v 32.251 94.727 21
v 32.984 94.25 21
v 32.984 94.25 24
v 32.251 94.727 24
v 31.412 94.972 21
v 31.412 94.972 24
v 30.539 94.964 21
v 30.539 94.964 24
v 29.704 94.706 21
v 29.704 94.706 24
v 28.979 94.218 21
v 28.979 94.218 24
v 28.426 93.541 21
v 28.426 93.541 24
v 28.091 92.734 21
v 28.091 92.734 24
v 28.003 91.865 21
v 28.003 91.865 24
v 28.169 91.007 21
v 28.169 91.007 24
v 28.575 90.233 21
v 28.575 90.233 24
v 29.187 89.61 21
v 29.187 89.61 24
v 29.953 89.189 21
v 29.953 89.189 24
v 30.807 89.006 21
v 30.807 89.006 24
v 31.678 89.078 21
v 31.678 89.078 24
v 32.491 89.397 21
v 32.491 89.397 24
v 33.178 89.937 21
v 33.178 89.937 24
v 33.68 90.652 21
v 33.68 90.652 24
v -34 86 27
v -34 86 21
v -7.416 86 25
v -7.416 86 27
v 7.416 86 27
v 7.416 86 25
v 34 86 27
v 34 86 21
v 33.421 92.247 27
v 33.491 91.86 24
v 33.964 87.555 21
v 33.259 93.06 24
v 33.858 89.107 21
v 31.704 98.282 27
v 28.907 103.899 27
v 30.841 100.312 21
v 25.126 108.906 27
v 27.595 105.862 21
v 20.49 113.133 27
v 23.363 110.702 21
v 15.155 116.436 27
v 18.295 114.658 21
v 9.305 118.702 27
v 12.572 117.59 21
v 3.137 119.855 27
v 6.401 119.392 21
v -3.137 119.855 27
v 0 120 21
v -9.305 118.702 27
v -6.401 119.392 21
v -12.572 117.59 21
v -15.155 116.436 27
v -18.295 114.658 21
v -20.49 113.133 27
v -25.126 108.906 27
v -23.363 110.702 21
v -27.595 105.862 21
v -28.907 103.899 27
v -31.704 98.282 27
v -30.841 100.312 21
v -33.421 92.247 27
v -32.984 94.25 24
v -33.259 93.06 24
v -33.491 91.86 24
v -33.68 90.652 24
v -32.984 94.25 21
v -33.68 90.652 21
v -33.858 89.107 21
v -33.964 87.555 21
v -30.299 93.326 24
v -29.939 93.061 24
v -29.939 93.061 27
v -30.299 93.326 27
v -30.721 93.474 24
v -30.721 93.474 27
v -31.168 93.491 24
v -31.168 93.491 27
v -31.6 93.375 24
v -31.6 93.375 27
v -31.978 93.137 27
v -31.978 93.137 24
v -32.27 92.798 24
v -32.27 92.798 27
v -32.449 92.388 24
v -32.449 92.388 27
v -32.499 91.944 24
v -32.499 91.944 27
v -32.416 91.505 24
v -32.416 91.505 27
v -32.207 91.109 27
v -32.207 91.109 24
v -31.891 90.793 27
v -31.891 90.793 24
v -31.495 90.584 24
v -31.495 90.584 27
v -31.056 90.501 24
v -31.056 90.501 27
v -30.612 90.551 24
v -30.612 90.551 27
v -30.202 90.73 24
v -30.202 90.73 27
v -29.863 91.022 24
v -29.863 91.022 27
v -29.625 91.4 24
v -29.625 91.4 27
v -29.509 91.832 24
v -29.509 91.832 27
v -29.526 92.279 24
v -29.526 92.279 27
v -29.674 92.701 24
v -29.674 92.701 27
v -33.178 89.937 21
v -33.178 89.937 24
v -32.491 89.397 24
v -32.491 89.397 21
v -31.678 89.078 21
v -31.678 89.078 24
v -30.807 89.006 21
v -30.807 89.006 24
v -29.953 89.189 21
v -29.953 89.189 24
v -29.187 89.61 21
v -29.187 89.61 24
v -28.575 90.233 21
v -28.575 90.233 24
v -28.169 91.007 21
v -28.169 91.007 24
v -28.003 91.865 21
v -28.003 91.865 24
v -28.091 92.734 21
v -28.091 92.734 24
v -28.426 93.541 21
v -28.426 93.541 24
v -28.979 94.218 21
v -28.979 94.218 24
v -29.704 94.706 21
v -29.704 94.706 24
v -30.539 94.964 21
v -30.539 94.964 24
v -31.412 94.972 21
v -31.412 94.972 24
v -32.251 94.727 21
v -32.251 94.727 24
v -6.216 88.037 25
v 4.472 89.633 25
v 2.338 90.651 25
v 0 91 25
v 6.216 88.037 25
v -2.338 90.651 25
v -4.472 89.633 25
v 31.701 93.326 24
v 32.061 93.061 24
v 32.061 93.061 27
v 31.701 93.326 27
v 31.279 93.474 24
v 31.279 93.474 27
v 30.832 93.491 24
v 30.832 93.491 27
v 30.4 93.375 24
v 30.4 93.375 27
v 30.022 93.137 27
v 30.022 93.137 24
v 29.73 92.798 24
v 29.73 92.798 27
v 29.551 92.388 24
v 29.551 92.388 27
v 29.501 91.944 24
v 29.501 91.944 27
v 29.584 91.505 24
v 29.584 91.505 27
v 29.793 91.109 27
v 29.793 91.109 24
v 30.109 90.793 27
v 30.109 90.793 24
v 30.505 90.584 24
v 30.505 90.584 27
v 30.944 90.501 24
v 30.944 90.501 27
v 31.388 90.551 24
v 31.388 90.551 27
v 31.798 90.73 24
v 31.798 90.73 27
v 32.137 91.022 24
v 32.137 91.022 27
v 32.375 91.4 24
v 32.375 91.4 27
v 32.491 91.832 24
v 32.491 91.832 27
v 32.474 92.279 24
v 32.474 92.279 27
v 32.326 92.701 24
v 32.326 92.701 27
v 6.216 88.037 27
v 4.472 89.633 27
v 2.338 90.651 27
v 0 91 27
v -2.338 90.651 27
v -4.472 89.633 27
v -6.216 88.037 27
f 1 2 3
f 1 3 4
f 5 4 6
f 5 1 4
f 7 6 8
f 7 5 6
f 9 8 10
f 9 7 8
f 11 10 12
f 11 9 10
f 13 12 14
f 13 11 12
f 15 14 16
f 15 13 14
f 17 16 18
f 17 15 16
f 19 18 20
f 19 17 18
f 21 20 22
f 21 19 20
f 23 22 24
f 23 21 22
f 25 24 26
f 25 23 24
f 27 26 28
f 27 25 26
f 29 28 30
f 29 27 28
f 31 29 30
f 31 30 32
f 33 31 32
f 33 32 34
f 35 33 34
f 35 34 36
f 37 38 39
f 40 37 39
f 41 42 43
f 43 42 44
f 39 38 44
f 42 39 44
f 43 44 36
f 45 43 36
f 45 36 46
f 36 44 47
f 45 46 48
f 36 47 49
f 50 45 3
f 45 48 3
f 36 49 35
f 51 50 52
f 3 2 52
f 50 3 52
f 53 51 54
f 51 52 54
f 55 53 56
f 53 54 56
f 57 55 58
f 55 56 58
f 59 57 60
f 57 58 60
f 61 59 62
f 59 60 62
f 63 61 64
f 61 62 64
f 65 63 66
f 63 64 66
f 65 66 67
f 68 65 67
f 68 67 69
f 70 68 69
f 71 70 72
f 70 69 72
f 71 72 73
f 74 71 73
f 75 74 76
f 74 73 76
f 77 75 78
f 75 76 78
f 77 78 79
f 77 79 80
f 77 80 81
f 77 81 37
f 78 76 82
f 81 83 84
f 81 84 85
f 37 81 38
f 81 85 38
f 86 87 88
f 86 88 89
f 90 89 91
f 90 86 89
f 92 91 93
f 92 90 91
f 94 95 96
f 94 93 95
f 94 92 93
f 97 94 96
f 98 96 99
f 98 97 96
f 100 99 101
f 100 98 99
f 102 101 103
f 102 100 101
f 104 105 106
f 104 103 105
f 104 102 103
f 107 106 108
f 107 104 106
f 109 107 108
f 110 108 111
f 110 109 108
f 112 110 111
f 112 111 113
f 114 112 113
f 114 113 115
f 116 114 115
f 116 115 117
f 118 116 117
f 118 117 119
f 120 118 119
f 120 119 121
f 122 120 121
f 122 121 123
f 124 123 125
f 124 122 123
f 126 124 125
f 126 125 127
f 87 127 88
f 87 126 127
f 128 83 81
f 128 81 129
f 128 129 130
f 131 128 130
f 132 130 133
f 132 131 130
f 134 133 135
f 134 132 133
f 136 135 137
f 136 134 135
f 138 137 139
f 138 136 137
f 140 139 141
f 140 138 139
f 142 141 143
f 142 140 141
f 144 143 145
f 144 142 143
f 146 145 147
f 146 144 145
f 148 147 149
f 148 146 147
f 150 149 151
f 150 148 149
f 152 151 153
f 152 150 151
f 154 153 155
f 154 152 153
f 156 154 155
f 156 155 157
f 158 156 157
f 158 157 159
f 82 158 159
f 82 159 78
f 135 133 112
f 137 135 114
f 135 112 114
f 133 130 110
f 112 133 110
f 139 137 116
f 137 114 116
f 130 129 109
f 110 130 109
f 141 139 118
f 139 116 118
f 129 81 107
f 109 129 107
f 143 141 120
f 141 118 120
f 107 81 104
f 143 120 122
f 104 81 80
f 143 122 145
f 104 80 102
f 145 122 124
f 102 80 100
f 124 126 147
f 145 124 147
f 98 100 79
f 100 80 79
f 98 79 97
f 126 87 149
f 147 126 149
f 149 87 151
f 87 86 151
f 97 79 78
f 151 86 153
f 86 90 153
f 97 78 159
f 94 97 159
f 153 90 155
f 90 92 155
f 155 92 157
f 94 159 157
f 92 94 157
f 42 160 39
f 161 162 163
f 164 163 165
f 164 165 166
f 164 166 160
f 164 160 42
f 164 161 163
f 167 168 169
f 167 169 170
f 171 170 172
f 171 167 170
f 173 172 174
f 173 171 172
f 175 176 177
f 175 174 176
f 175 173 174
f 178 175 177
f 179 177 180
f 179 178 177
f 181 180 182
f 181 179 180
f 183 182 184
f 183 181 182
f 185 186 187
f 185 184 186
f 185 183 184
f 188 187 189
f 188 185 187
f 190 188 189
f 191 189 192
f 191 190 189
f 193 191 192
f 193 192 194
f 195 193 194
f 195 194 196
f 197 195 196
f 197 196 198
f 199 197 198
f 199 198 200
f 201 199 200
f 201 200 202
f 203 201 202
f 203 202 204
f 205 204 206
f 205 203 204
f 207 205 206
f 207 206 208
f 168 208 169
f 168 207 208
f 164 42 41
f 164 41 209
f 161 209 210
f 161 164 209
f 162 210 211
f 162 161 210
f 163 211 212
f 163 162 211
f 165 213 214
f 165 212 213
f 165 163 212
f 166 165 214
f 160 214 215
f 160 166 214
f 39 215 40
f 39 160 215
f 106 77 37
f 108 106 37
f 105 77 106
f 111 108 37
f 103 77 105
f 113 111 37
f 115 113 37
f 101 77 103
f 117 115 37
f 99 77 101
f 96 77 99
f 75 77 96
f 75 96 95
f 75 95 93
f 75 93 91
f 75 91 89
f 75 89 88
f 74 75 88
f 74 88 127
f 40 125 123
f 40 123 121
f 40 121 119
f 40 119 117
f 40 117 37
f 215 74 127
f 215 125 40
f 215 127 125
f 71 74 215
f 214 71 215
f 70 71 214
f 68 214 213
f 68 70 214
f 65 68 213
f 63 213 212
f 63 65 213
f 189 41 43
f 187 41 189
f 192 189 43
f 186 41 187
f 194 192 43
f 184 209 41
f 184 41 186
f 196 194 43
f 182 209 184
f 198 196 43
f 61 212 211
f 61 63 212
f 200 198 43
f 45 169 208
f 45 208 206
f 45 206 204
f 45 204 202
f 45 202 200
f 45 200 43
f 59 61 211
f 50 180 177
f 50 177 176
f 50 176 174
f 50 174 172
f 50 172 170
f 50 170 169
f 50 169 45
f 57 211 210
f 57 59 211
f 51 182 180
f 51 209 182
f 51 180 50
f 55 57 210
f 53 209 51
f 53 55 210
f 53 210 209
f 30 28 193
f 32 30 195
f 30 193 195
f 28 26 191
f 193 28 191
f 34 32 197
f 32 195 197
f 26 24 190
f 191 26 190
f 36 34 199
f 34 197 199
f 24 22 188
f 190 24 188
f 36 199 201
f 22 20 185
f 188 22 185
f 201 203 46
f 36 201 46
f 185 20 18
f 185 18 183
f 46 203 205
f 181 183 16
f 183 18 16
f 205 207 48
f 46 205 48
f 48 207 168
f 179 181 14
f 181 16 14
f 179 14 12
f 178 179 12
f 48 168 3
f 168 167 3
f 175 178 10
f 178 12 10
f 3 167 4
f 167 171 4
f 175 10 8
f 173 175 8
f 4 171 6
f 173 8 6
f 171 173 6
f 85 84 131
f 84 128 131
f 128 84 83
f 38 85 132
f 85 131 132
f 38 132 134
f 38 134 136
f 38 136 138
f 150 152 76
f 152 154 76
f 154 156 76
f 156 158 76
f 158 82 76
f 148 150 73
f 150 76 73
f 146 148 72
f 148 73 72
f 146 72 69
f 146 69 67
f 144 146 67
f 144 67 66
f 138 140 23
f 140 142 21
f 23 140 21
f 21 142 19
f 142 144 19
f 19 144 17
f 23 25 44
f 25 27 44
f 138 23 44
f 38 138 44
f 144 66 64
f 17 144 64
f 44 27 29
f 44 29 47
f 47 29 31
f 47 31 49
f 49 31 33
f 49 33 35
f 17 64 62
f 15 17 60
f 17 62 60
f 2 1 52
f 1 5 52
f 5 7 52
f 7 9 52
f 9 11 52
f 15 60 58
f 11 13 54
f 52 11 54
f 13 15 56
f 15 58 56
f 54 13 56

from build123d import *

# Parameters (mm, degrees)
CYLINDER687_R               = 8
CYLINDER687_DEPTH           = 6
CYLINDER688_R               = 3
CYLINDER688_DEPTH           = 3
CYLINDER688_PLACEMENT_ANGLE = 45
CYLINDER668_R               = 3
CYLINDER668_DEPTH           = 3
CYLINDER668_PLACEMENT_ANGLE = 45
CYLINDER676_R               = 3
CYLINDER676_DEPTH           = 3
CYLINDER676_PLACEMENT_ANGLE = 45
CYLINDER683_R               = 3
CYLINDER683_DEPTH           = 3
CYLINDER683_PLACEMENT_ANGLE = 45
CYLINDER681_R               = 1.5
CYLINDER681_DEPTH           = 50
CYLINDER681_PLACEMENT_ANGLE = 45
CYLINDER686_R               = 1.5
CYLINDER686_DEPTH           = 50
CYLINDER686_PLACEMENT_ANGLE = 45
CYLINDER685_R               = 1.5
CYLINDER685_DEPTH           = 50
CYLINDER685_PLACEMENT_ANGLE = 45
CYLINDER675_R               = 1.5
CYLINDER675_DEPTH           = 50
CYLINDER675_PLACEMENT_ANGLE = 45
BOX250_W                    = 148
BOX250_H                    = 40
BOX250_DEPTH                = 40
CYLINDER671_R               = 34
CYLINDER671_DEPTH           = 6


with BuildPart() as v_lec687:
    # Cylinder687 → Cylinder687 (new body)
    with BuildSketch(Plane(origin=(0, 83, 25), x_dir=(1, 0, 0), z_dir=(0, 0, 1))):
        Circle(CYLINDER687_R)
    extrude(amount=CYLINDER687_DEPTH)


with BuildPart() as v_lec688:
    # Cylinder688 → Cylinder688 (new body)
    with BuildSketch(Plane.XY):
        Circle(CYLINDER688_R)
    extrude(amount=CYLINDER688_DEPTH)


with BuildPart() as v_lec688_1:
    # Cylinder688 placement: moved
    add(v_lec688.part.moved(Location((-31, 92, 21))).rotate(Axis((-31, 92, 21), (0, 0, 1)), CYLINDER688_PLACEMENT_ANGLE))


with BuildPart() as v_lec668:
    # Cylinder668 → Cylinder668 (new body)
    with BuildSketch(Plane.XY):
        Circle(CYLINDER668_R)
    extrude(amount=CYLINDER668_DEPTH)


with BuildPart() as v_lec668_1:
    # Cylinder668 placement: moved
    add(v_lec668.part.moved(Location((31, 110, 0))).rotate(Axis((31, 110, 0), (0, 0, 1)), CYLINDER668_PLACEMENT_ANGLE))


with BuildPart() as v_lec676:
    # Cylinder676 → Cylinder676 (new body)
    with BuildSketch(Plane.XY):
        Circle(CYLINDER676_R)
    extrude(amount=CYLINDER676_DEPTH)


with BuildPart() as v_lec676_1:
    # Cylinder676 placement: moved
    add(v_lec676.part.moved(Location((31, 92, 21))).rotate(Axis((31, 92, 21), (0, 0, 1)), CYLINDER676_PLACEMENT_ANGLE))


with BuildPart() as compound400:
    # Cylinder683 → Cylinder683 (new body)
    with BuildSketch(Plane.XY):
        Circle(CYLINDER683_R)
    extrude(amount=CYLINDER683_DEPTH)


with BuildPart() as compound400_1:
    # Cylinder683 placement: moved
    add(compound400.part.moved(Location((-31, 110, 0))).rotate(Axis((-31, 110, 0), (0, 0, 1)), CYLINDER683_PLACEMENT_ANGLE))

    # Compound400: union Válec688, Válec668, Válec676
    add(v_lec688_1.part)
    add(v_lec668_1.part)
    add(v_lec676_1.part)


with BuildPart() as v_lec681:
    # Cylinder681 → Cylinder681 (new body)
    with BuildSketch(Plane.XY):
        Circle(CYLINDER681_R)
    extrude(amount=CYLINDER681_DEPTH)


with BuildPart() as v_lec681_1:
    # Cylinder681 placement: moved
    add(v_lec681.part.moved(Location((-31, 92, 0))).rotate(Axis((-31, 92, 0), (0, 0, 1)), CYLINDER681_PLACEMENT_ANGLE))


with BuildPart() as v_lec686:
    # Cylinder686 → Cylinder686 (new body)
    with BuildSketch(Plane.XY):
        Circle(CYLINDER686_R)
    extrude(amount=CYLINDER686_DEPTH)


with BuildPart() as v_lec686_1:
    # Cylinder686 placement: moved
    add(v_lec686.part.moved(Location((31, 110, 0))).rotate(Axis((31, 110, 0), (0, 0, 1)), CYLINDER686_PLACEMENT_ANGLE))


with BuildPart() as v_lec685:
    # Cylinder685 → Cylinder685 (new body)
    with BuildSketch(Plane.XY):
        Circle(CYLINDER685_R)
    extrude(amount=CYLINDER685_DEPTH)


with BuildPart() as v_lec685_1:
    # Cylinder685 placement: moved
    add(v_lec685.part.moved(Location((31, 92, 0))).rotate(Axis((31, 92, 0), (0, 0, 1)), CYLINDER685_PLACEMENT_ANGLE))


with BuildPart() as compound396:
    # Cylinder675 → Cylinder675 (new body)
    with BuildSketch(Plane.XY):
        Circle(CYLINDER675_R)
    extrude(amount=CYLINDER675_DEPTH)


with BuildPart() as compound396_1:
    # Cylinder675 placement: moved
    add(compound396.part.moved(Location((-31, 110, 0))).rotate(Axis((-31, 110, 0), (0, 0, 1)), CYLINDER675_PLACEMENT_ANGLE))

    # Compound396: union Válec681, Válec686, Válec685
    add(v_lec681_1.part)
    add(v_lec686_1.part)
    add(v_lec685_1.part)


with BuildPart() as krychle250:
    # Box250 → Box250 (new body)
    with BuildSketch(Plane(origin=(-74, 46, 16), x_dir=(1, 0, 0), z_dir=(0, 0, 1))):
        with Locations((74, 20)):
            Rectangle(BOX250_W, BOX250_H)
    extrude(amount=BOX250_DEPTH)


with BuildPart() as cut274:
    # Cylinder671 → Cylinder671 (new body)
    with BuildSketch(Plane(origin=(0, 86, 21), x_dir=(1, 0, 0), z_dir=(0, 0, 1))):
        Circle(CYLINDER671_R)
    extrude(amount=CYLINDER671_DEPTH)

    # Cut271: cut Krychle250
    add(krychle250.part, mode=Mode.SUBTRACT)

    # Cut277: cut Compound396
    add(compound396_1.part, mode=Mode.SUBTRACT)

    # Cut275: cut Compound400
    add(compound400_1.part, mode=Mode.SUBTRACT)

    # Cut274: cut Válec687
    add(v_lec687.part, mode=Mode.SUBTRACT)


solid = cut274.part
